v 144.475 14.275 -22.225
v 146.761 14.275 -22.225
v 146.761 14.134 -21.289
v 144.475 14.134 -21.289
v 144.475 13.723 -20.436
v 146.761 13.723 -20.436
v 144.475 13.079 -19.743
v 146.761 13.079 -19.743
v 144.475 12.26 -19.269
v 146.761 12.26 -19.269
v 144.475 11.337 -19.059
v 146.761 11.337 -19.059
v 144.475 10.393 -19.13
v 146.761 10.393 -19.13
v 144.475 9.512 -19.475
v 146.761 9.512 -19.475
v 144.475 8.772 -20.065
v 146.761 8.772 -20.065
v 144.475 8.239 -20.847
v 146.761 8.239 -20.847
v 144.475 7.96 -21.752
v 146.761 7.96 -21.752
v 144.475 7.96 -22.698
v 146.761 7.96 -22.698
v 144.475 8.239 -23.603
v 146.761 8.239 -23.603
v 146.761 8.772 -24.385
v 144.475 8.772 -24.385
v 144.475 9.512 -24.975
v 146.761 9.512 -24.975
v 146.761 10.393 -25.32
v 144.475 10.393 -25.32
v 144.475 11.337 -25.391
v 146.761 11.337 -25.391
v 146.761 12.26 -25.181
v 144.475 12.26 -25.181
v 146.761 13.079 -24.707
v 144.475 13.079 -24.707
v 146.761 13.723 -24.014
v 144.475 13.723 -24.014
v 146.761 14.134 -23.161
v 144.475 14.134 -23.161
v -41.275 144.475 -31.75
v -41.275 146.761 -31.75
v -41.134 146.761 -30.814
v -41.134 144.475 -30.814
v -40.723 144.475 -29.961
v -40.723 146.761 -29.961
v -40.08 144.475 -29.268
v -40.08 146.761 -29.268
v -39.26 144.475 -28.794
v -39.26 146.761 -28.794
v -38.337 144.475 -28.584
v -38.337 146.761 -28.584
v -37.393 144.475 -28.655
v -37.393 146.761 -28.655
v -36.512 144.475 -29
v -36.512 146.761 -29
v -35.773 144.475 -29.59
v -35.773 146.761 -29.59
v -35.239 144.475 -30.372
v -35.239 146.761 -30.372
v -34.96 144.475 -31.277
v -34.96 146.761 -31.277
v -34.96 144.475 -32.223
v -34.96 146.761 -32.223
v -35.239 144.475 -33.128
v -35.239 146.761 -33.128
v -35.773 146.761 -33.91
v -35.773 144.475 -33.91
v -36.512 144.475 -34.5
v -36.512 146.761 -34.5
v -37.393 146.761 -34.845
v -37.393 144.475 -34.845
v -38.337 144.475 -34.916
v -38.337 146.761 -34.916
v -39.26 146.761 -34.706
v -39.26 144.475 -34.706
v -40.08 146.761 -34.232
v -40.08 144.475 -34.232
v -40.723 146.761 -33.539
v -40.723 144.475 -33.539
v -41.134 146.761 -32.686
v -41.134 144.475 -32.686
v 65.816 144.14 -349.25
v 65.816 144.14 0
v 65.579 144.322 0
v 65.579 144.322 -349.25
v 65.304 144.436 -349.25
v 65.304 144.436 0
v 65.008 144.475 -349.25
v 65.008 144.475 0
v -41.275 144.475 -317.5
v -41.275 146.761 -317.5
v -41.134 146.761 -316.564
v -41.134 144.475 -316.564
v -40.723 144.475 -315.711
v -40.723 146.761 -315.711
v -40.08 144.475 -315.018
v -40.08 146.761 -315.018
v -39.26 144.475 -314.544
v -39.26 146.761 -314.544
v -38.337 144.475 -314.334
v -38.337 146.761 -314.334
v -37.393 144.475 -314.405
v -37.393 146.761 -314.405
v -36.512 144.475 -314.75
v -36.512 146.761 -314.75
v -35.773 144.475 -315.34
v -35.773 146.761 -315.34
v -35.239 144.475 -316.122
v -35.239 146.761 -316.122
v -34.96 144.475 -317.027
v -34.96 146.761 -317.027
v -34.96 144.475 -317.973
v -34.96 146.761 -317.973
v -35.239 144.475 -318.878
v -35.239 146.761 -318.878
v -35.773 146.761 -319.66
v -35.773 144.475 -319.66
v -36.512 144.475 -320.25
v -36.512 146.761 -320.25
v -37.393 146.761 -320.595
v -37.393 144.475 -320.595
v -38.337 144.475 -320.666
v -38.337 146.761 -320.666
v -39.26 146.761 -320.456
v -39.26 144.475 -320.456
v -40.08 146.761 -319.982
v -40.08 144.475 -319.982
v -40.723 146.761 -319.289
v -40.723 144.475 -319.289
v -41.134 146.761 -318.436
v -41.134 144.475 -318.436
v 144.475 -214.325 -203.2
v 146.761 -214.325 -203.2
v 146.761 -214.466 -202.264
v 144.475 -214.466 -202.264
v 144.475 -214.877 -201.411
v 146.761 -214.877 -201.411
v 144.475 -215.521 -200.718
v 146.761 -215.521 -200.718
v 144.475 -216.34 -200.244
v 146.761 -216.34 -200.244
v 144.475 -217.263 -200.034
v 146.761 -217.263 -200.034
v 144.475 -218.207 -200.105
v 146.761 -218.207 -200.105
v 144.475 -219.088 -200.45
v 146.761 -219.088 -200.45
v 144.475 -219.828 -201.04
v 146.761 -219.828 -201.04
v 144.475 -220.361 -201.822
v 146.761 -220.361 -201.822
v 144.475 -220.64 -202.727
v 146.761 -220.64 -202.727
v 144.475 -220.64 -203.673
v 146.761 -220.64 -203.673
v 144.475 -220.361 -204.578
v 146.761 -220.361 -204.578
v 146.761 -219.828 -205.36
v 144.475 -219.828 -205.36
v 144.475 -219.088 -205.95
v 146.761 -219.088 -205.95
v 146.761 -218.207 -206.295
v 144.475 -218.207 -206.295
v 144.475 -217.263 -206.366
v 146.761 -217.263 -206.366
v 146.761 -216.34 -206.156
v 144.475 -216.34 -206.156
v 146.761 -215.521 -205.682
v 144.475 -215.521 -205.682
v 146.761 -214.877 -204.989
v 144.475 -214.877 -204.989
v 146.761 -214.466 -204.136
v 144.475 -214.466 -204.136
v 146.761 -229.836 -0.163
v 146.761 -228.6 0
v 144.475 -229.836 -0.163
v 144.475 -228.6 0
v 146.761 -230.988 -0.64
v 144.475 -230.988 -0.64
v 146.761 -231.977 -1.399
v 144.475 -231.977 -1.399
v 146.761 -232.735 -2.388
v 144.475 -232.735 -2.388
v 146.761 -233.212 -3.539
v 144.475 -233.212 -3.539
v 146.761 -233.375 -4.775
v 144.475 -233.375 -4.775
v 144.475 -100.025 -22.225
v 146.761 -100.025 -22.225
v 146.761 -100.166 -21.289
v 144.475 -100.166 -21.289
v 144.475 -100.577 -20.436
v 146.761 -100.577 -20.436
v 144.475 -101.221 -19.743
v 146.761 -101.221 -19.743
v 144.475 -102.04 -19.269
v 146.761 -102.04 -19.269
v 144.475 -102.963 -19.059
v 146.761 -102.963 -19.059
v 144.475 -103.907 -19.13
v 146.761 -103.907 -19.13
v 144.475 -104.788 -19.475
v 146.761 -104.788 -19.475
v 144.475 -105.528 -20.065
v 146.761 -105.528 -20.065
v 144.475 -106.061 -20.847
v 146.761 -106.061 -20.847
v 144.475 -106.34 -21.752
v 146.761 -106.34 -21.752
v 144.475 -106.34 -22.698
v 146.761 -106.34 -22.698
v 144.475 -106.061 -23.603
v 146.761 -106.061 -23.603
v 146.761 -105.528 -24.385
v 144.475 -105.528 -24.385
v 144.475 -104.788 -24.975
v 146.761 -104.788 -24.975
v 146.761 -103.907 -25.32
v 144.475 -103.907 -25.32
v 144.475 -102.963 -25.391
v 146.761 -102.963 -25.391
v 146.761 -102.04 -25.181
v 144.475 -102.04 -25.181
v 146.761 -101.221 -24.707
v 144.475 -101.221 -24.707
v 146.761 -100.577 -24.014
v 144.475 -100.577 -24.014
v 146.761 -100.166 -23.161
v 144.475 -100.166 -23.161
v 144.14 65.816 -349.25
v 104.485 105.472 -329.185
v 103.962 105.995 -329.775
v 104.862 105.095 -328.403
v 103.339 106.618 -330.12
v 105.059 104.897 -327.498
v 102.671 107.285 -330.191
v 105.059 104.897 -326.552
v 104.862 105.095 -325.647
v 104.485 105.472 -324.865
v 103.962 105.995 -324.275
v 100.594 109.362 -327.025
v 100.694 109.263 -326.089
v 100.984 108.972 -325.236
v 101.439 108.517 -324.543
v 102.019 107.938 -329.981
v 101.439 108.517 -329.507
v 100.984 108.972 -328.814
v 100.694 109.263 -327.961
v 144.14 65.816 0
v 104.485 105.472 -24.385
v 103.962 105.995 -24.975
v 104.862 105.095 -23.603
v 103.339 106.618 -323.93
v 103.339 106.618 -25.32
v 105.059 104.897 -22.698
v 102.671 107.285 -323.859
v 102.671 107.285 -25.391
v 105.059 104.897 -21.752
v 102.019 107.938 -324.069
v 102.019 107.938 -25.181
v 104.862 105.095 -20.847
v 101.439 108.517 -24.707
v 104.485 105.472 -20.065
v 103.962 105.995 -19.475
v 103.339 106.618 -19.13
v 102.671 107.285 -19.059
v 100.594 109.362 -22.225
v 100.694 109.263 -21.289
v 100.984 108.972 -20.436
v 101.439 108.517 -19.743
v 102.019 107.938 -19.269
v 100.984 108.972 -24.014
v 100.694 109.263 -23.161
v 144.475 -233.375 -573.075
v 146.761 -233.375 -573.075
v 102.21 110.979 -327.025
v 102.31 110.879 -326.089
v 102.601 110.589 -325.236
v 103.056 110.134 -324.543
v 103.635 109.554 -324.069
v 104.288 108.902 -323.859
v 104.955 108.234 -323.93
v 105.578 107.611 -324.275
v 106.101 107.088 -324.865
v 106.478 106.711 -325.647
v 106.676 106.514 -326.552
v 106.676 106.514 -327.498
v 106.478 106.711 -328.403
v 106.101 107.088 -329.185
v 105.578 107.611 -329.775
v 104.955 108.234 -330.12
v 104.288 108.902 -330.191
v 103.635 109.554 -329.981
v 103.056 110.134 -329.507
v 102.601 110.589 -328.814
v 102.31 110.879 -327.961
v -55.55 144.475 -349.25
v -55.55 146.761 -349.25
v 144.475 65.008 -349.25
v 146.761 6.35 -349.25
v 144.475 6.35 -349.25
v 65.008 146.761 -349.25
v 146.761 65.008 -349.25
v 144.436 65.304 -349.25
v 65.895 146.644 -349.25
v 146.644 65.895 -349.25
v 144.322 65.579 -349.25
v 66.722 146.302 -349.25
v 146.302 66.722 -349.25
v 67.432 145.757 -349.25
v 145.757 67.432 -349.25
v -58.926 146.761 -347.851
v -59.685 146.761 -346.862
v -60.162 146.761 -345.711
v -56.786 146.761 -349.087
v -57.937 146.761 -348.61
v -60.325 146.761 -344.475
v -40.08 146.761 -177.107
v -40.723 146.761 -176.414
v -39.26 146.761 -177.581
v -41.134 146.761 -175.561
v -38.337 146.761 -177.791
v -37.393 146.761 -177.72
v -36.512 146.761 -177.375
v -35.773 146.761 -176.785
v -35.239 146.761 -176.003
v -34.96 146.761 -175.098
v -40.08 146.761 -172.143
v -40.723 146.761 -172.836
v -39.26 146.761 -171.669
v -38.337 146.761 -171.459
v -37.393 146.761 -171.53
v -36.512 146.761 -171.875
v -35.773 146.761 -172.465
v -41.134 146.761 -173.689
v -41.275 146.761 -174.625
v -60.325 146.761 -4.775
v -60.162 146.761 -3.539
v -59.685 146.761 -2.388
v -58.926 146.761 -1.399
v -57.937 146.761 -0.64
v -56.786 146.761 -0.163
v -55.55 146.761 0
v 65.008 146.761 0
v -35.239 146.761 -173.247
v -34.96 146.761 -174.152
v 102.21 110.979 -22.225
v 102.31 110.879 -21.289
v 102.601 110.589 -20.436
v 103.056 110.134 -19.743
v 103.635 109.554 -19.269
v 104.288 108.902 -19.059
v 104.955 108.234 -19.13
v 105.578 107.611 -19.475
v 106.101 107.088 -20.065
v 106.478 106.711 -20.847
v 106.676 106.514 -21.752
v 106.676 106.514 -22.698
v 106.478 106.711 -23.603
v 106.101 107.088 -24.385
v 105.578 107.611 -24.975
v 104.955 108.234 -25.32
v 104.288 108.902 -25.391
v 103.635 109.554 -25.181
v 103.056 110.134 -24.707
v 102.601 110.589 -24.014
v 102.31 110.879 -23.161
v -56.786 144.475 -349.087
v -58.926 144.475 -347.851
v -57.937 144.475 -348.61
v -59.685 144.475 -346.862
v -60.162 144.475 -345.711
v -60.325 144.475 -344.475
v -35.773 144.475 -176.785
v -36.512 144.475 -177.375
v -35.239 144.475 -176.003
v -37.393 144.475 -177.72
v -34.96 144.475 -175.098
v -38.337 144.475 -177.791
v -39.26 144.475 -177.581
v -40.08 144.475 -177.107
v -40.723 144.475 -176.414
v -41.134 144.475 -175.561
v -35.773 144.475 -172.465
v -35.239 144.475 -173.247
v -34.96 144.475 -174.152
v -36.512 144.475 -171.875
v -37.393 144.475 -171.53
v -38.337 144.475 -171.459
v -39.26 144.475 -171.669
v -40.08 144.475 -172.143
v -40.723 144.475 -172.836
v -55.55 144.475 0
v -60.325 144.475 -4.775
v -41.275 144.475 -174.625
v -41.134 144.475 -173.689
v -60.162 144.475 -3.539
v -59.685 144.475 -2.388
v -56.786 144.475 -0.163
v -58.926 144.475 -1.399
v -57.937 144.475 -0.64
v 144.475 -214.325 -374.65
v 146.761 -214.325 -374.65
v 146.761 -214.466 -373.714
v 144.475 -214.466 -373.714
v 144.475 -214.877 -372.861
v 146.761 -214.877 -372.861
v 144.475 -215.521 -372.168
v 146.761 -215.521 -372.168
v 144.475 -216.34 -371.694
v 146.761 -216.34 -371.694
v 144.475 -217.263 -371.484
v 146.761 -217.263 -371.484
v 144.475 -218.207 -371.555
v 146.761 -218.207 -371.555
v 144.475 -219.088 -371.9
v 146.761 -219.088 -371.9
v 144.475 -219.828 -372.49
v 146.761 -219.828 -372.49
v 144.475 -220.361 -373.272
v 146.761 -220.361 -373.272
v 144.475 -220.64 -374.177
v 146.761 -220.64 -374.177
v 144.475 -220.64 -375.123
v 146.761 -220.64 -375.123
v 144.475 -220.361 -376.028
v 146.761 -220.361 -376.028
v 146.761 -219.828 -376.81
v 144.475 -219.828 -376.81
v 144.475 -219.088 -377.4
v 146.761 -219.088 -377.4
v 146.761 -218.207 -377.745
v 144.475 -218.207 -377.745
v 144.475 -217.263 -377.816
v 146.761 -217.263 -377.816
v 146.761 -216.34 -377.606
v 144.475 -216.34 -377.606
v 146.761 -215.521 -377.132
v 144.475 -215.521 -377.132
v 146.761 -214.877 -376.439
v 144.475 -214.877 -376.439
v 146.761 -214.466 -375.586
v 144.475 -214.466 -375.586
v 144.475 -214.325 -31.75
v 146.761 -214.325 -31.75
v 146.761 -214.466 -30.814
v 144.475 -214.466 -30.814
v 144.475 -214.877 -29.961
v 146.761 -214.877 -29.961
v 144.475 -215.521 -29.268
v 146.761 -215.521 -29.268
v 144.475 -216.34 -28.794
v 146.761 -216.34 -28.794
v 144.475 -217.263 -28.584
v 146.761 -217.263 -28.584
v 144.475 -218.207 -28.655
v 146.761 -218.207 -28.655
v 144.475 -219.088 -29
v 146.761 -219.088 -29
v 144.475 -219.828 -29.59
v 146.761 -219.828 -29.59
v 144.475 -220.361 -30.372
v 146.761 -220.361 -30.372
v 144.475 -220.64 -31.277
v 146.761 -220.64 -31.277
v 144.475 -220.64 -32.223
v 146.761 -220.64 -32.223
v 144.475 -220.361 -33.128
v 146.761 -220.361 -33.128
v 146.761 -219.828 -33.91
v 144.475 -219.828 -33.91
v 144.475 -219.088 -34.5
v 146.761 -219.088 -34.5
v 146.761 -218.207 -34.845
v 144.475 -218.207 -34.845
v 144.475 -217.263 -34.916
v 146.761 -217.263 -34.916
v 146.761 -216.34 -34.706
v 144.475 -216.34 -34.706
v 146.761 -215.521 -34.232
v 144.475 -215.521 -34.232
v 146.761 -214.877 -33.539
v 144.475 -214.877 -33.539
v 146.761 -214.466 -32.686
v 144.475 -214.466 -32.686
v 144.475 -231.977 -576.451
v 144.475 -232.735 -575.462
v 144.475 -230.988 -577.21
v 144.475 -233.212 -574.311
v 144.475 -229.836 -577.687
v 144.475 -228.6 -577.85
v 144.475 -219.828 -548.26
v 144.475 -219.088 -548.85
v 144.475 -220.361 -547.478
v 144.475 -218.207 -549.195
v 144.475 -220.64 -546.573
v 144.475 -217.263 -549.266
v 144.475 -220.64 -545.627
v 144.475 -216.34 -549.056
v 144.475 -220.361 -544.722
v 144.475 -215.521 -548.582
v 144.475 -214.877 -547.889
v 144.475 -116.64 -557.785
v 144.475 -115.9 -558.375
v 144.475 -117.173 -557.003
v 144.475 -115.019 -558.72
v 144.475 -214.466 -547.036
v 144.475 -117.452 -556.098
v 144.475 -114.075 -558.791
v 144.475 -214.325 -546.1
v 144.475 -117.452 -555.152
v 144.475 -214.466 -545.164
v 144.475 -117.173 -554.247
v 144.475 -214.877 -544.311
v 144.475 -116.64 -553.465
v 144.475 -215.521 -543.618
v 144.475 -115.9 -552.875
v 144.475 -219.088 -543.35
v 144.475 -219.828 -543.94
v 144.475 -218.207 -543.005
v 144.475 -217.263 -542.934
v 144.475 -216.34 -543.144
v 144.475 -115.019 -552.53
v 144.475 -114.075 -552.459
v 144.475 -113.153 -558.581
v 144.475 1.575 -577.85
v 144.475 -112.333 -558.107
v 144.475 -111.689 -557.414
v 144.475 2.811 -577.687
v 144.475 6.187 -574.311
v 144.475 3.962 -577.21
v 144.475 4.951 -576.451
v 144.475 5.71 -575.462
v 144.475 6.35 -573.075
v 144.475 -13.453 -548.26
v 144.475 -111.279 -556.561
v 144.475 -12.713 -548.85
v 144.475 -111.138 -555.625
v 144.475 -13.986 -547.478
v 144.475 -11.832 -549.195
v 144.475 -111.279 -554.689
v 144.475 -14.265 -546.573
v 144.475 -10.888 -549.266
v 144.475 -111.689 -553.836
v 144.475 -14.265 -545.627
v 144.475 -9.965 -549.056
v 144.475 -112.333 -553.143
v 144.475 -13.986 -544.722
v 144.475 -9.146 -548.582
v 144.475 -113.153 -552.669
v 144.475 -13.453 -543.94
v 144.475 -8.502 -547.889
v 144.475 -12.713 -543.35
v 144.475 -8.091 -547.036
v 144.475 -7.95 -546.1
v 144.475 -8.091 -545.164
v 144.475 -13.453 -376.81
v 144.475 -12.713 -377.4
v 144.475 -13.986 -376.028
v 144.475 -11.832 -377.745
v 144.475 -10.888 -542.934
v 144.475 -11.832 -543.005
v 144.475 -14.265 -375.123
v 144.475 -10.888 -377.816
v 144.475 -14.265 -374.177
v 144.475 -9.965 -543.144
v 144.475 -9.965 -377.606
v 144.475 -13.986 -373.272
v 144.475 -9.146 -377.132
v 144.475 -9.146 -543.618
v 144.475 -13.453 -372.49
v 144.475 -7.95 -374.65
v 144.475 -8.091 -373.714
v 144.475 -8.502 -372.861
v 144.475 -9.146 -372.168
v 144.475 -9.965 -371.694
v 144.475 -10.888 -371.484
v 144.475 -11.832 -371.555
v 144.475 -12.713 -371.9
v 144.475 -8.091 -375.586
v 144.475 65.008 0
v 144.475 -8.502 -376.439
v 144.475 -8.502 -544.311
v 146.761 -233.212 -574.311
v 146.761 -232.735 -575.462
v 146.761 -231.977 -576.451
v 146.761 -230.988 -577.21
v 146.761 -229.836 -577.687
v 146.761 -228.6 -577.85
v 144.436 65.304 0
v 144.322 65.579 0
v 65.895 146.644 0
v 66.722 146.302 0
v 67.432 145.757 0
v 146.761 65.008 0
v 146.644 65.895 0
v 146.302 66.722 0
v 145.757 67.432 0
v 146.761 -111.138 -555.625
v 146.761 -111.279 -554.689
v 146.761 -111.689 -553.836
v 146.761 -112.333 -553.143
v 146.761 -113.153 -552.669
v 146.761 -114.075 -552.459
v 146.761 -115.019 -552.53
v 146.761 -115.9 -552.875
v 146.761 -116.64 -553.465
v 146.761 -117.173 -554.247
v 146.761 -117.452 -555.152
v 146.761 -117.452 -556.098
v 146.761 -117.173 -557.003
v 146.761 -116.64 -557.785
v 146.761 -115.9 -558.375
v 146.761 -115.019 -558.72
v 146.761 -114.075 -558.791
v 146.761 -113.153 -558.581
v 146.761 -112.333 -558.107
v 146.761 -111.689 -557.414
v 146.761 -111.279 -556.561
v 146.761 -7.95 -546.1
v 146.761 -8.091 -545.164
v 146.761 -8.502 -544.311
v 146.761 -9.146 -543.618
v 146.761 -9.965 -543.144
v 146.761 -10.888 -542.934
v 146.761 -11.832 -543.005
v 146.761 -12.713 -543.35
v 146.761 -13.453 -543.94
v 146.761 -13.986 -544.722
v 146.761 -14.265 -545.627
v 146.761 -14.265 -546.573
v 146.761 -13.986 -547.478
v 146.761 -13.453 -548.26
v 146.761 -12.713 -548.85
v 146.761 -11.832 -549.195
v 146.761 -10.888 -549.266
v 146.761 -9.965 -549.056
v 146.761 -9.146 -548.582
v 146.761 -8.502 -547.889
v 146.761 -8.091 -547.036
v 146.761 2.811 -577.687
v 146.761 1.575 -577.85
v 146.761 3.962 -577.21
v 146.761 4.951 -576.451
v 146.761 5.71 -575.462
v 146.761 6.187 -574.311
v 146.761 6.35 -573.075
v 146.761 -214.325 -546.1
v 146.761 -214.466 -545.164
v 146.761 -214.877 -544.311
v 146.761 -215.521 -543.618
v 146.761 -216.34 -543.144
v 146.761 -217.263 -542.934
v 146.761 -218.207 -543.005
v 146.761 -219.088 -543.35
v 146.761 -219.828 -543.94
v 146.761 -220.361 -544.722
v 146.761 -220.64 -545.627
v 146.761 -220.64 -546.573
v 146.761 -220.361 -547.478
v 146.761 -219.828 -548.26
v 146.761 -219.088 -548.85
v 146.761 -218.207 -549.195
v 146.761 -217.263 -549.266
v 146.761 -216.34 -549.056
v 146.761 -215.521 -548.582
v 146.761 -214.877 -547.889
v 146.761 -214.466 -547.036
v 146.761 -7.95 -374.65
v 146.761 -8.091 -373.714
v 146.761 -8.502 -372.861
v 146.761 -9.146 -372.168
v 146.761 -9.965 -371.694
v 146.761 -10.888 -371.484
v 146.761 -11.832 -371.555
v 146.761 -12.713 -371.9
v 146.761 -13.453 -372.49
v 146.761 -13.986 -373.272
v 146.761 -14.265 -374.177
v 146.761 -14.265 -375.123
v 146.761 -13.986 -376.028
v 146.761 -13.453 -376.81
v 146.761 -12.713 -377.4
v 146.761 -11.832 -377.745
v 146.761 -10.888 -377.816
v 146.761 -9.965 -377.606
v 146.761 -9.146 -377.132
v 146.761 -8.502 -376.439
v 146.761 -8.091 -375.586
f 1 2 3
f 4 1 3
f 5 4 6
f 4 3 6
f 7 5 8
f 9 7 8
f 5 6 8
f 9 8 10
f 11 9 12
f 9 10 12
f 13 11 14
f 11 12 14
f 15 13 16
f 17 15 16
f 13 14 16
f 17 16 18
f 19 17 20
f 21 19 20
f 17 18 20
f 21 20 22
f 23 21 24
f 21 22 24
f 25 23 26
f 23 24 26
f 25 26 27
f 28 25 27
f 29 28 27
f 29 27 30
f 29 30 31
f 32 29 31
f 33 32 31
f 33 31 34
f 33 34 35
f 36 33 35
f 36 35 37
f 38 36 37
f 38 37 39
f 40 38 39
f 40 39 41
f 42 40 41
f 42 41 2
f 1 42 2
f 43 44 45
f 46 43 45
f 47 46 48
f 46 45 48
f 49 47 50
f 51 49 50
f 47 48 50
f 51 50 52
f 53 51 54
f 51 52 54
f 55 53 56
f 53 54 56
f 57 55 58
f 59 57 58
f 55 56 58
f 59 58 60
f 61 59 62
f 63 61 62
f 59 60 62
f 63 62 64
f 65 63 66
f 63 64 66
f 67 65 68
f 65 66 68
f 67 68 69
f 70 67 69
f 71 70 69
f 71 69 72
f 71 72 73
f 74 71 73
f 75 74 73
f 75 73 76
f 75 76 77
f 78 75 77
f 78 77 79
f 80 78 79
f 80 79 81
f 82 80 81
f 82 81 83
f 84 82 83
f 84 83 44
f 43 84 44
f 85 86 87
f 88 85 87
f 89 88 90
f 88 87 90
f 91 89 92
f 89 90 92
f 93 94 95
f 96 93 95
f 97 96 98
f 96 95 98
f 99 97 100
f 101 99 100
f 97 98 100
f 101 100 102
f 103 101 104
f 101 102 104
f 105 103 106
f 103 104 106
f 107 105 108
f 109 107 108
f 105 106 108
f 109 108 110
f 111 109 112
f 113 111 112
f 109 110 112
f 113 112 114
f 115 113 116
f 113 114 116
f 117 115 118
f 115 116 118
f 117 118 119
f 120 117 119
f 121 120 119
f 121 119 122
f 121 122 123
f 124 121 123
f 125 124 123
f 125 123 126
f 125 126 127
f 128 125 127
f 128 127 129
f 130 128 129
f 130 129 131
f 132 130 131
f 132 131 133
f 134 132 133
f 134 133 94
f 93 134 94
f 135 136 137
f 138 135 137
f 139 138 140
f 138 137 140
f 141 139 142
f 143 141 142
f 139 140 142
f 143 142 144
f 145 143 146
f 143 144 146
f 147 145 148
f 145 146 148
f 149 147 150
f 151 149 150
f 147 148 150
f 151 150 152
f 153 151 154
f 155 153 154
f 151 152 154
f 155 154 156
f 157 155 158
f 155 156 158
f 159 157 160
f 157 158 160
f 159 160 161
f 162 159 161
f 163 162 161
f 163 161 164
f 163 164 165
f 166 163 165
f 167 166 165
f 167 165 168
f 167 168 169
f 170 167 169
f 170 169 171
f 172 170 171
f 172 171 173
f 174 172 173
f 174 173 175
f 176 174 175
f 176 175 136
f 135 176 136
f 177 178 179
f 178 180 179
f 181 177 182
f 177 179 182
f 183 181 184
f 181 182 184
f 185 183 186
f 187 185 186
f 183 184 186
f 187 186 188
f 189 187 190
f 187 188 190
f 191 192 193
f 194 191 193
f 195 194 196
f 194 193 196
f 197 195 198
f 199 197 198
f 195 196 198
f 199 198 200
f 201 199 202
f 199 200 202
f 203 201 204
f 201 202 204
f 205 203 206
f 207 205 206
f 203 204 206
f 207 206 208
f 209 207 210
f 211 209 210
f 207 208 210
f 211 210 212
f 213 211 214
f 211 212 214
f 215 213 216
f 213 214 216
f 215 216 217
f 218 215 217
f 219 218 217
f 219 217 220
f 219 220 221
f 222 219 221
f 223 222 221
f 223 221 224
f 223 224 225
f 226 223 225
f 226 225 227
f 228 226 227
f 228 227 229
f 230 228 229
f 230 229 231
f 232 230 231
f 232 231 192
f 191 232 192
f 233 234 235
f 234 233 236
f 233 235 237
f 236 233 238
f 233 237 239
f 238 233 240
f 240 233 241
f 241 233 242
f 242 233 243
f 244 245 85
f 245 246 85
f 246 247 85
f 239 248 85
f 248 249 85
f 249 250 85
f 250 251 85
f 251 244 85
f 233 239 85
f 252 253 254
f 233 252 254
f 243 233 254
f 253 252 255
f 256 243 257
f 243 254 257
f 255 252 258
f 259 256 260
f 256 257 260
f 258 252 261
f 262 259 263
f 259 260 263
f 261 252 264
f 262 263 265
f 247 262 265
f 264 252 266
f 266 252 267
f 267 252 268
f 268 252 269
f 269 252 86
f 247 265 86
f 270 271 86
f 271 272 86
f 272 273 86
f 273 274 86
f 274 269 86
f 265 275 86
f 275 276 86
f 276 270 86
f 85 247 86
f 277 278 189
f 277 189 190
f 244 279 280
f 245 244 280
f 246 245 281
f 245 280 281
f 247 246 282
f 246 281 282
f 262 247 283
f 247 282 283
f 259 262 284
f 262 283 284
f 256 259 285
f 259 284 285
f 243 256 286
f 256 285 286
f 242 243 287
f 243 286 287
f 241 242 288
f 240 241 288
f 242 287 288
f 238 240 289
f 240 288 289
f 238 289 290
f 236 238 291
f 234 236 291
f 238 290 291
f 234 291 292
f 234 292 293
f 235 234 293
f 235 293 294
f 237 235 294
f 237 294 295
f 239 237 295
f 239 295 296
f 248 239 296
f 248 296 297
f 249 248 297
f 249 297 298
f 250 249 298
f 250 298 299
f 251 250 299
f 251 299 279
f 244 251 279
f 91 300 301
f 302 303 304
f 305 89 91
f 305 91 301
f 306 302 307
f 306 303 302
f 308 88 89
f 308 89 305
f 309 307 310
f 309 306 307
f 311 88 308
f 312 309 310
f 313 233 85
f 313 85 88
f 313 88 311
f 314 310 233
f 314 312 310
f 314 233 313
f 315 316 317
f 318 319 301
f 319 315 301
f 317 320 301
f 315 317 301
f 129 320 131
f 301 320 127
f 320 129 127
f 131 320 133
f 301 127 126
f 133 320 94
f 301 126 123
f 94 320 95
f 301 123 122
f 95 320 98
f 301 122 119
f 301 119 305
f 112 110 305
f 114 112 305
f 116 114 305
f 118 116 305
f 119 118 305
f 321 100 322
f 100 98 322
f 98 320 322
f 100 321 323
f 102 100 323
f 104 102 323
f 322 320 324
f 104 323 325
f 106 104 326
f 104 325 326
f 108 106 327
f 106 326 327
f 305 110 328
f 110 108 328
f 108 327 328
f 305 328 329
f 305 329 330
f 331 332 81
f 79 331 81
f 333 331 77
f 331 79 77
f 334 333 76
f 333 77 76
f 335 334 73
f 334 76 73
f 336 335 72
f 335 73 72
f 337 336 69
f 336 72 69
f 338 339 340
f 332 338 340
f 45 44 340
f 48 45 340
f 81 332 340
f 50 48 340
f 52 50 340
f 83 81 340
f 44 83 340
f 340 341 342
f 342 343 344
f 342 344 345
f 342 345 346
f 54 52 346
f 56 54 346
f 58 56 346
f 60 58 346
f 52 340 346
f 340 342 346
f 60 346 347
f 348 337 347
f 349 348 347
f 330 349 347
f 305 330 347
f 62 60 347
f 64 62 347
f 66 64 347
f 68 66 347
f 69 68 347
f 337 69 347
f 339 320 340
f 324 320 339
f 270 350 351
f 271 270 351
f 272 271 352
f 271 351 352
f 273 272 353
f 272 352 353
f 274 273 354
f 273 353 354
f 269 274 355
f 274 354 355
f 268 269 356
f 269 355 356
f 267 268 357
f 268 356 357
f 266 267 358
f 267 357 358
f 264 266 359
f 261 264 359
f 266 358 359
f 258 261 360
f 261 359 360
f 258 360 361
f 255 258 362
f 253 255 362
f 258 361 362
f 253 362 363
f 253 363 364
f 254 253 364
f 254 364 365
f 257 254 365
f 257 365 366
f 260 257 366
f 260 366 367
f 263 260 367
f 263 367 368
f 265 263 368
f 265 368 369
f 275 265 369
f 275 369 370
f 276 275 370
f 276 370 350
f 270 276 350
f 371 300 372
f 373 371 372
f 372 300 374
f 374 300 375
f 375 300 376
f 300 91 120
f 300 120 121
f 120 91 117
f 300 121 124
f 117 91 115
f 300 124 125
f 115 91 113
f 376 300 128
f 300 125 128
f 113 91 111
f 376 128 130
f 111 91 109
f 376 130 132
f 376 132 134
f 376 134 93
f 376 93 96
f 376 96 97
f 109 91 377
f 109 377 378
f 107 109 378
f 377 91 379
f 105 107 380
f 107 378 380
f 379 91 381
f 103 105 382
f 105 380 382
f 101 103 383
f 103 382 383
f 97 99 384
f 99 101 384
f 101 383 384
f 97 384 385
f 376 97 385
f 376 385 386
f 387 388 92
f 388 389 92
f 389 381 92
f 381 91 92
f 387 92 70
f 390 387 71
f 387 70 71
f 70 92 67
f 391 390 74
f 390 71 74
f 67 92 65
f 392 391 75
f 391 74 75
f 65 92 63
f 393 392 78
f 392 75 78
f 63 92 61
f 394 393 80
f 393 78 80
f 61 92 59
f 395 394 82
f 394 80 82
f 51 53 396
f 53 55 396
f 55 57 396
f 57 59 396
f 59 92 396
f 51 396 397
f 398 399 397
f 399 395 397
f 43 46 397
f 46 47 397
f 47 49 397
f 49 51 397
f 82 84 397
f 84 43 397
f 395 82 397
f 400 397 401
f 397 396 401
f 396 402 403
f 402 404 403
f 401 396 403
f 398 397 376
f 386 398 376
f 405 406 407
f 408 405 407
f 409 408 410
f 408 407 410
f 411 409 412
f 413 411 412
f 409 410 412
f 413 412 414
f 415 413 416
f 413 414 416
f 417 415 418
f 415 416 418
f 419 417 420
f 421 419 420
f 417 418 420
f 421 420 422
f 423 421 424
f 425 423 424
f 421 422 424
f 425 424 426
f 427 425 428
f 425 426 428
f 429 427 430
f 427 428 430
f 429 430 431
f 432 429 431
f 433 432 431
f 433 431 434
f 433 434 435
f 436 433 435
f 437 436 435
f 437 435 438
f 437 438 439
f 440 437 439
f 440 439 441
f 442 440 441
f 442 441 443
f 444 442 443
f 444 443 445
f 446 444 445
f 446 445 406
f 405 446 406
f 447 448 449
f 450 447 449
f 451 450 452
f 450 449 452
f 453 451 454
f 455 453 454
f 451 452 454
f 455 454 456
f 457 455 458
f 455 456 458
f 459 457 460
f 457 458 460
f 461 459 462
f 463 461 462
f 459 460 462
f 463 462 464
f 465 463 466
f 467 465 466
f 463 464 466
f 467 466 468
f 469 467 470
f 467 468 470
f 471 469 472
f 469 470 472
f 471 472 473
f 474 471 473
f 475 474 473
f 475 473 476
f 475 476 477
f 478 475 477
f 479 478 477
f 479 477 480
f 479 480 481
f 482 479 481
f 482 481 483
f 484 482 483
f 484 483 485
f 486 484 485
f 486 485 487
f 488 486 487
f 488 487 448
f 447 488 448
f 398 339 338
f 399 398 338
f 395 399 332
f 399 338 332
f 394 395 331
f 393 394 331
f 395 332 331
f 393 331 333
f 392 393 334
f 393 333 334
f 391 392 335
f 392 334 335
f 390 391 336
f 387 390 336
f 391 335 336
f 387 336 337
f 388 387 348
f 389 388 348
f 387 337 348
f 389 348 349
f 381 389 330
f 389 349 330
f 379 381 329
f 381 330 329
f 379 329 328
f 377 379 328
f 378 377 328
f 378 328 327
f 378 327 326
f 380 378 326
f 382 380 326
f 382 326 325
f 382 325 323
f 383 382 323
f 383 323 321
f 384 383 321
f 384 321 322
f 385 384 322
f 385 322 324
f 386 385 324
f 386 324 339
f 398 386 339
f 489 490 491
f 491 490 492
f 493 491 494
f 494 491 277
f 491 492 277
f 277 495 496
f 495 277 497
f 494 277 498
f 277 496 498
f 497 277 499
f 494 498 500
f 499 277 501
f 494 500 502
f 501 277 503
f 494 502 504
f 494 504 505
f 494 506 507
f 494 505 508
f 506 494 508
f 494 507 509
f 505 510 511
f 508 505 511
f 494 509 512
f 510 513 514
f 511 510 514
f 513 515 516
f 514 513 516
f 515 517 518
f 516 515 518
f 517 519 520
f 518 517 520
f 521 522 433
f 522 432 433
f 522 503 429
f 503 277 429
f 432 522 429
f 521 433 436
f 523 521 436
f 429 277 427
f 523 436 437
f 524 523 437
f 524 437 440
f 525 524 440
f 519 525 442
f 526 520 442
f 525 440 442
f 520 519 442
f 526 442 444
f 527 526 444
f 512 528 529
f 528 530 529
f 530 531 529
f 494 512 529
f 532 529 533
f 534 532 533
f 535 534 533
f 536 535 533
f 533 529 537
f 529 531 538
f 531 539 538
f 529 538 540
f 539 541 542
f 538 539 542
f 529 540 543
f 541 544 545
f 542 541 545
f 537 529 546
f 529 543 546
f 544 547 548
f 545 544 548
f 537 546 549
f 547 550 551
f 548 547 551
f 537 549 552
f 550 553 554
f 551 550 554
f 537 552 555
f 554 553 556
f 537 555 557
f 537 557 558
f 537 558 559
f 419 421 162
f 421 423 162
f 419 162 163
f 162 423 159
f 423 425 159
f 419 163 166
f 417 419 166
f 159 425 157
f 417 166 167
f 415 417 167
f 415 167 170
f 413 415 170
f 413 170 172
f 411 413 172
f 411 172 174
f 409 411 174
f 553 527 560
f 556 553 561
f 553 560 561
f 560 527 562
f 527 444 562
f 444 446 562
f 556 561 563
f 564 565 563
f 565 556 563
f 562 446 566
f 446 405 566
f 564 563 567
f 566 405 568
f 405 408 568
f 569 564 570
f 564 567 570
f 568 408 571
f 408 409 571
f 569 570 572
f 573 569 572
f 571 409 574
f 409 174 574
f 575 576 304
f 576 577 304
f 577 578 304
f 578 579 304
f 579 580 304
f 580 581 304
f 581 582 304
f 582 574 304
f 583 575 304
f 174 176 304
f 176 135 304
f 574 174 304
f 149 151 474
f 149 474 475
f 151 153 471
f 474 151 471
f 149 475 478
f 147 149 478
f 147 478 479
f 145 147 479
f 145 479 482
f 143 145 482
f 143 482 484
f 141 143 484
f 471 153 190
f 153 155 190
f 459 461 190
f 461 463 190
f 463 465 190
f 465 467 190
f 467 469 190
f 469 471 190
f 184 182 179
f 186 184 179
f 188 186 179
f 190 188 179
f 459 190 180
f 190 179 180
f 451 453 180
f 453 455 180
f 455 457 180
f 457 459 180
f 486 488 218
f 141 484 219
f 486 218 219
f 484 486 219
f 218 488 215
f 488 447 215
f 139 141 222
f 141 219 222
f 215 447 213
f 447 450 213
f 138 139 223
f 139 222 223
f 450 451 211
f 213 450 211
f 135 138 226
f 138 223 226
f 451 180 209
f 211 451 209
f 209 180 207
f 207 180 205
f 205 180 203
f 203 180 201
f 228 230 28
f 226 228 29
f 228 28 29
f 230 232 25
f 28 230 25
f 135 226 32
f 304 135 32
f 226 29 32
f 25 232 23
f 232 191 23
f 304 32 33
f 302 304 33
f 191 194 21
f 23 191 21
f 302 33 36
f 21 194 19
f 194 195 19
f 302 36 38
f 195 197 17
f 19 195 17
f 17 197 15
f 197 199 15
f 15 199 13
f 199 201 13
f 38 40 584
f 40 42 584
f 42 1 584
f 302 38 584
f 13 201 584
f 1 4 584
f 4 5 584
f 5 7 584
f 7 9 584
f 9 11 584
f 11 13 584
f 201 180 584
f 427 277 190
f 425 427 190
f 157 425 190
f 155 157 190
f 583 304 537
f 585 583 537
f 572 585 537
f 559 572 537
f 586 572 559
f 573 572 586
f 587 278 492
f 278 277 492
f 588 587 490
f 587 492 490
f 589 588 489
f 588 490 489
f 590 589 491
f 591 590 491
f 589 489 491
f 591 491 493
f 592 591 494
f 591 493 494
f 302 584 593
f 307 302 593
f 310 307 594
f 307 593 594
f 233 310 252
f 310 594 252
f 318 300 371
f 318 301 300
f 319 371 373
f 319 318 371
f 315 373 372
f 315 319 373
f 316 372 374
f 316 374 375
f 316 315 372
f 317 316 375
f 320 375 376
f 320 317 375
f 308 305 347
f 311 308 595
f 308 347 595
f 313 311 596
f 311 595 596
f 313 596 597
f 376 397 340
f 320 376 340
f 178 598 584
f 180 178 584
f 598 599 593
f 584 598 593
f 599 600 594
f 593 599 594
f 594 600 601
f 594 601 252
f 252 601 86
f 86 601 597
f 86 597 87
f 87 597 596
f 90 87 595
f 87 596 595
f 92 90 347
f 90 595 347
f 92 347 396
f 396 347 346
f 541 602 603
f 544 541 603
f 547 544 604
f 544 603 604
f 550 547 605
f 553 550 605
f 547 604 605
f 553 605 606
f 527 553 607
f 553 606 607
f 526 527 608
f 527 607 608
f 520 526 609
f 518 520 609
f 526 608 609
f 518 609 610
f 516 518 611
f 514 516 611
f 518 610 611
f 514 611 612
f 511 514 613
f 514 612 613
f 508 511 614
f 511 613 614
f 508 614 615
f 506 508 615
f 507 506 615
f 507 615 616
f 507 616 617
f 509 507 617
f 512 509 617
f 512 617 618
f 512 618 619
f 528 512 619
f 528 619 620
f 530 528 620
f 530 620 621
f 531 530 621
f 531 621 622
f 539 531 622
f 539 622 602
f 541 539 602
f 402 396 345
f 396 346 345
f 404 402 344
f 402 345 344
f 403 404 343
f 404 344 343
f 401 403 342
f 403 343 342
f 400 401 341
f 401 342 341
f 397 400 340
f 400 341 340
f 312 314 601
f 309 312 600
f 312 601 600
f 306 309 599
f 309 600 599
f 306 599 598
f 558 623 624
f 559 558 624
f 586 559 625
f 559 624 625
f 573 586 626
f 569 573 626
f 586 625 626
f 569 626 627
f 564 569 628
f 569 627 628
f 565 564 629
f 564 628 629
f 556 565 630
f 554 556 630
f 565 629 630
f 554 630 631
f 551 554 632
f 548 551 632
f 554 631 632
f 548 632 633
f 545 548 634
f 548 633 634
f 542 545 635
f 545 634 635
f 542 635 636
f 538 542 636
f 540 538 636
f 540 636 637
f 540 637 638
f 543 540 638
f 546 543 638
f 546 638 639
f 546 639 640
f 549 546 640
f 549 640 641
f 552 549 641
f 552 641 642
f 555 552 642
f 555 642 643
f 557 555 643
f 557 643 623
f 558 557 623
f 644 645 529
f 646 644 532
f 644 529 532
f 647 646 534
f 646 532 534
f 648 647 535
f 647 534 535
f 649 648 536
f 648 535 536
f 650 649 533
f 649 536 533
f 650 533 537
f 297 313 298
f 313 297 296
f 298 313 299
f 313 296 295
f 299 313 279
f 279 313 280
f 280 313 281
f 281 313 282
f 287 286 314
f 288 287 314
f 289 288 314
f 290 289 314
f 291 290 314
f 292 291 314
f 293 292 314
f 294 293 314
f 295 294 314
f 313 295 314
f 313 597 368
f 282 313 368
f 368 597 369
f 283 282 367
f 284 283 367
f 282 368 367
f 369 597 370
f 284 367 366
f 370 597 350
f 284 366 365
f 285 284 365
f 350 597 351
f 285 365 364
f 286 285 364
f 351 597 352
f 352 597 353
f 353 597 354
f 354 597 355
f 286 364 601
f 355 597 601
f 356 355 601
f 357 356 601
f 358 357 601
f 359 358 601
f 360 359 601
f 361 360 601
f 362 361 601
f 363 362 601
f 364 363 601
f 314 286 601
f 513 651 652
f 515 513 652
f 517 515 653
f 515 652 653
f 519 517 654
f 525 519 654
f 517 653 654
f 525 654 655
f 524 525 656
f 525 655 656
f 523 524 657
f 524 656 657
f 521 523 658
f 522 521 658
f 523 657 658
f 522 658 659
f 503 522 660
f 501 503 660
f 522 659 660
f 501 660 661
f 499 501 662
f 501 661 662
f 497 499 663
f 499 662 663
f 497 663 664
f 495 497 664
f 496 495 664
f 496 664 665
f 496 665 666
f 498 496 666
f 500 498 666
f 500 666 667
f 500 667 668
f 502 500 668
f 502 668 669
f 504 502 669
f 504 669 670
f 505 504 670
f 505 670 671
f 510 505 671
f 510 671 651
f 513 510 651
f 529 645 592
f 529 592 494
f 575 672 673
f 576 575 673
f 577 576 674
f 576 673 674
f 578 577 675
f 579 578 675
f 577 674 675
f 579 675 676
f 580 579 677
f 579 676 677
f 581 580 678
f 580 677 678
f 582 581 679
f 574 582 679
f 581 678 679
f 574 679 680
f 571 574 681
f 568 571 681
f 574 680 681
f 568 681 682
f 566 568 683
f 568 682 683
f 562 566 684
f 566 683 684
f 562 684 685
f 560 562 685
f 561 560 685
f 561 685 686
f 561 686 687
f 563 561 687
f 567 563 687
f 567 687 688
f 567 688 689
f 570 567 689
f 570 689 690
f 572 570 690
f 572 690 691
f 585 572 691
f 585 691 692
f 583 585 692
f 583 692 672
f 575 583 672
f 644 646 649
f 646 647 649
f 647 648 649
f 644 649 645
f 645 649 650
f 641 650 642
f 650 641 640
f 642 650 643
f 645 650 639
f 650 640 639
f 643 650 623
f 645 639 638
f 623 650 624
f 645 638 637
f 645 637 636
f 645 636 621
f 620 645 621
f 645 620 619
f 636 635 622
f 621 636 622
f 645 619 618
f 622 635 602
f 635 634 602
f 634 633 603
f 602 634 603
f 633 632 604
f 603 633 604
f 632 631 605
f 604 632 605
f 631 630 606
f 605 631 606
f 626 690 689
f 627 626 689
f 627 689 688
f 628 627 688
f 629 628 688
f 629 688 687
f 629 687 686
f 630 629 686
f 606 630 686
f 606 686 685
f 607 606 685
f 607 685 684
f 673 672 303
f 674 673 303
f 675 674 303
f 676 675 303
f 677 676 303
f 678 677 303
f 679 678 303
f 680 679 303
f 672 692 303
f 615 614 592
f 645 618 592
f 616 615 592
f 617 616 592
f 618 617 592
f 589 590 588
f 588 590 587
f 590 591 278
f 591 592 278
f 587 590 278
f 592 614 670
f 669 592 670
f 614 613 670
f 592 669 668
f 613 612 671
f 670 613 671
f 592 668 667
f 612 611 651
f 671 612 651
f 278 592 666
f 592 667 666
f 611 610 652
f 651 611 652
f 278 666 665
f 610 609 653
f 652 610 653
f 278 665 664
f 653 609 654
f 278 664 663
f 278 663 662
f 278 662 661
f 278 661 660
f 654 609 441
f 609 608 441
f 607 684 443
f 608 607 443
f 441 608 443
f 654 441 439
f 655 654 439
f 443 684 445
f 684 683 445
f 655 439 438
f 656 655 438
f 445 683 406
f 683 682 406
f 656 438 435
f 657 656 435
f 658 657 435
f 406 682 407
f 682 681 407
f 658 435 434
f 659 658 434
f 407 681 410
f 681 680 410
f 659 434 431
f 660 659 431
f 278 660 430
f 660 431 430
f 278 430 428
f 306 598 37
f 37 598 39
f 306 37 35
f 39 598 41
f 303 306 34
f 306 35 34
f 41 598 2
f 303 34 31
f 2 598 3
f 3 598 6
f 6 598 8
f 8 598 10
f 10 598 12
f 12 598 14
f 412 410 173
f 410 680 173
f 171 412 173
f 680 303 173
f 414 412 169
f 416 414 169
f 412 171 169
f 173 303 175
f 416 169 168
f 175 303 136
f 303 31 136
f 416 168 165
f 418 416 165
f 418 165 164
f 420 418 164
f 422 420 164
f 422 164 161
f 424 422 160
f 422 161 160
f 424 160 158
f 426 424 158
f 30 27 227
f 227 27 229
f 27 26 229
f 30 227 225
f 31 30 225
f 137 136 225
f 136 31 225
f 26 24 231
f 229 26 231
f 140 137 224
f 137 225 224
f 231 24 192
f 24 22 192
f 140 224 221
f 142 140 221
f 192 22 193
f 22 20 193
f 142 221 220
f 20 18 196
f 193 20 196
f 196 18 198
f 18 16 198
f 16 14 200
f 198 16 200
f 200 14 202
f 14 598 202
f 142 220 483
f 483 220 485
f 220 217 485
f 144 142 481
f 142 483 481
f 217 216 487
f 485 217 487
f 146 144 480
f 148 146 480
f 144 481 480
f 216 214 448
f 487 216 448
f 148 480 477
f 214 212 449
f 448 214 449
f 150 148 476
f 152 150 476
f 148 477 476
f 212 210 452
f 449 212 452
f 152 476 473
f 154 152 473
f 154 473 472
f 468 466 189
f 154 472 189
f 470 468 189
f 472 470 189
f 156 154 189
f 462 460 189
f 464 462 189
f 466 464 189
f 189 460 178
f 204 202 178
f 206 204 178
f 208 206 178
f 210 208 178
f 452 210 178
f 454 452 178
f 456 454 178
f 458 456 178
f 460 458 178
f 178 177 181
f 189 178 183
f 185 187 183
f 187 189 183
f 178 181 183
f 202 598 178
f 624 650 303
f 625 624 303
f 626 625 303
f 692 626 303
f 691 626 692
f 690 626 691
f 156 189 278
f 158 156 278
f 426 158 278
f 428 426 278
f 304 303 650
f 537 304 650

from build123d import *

# Parameters (mm, degrees)
BASE_FLANGE1_DEPTH                     = 577.85
SKETCH5_W                              = 369.801004036
SKETCH5_H                              = 271.212830699
CE_00_NOTCH_DEPTH                      = 254
SKETCH9_R                              = 3.175
CE_00_HOLES_0_250_SIDE_9_PLACES_DEPTH  = 7.62
SKETCH10_R                             = 3.175
CE_00_HOLES_0_250_ANGLE_2_PLACES_DEPTH = 7.62
SKETCH8_R                              = 3.175
CE_00_HOLES_0_250_TOP_3_PLACES_DEPTH   = 7.62
FILLET1_R                              = 4.7752


# Sheet-metal steps are written as plain solids
with BuildPart() as part:
    # Sketch1 → Base-Flange1 (new body)
    with BuildSketch(Plane.XY):
        with BuildLine():
            Line((144.4752, -233.3752), (144.4752, 65.007753898))
            ThreePointArc((144.4752, 65.007753898), (144.388194306, 65.445161061), (144.140423051, 65.815976949))
            Line((144.140423051, 65.815976949), (65.815976949, 144.140423051))
            ThreePointArc((65.815976949, 144.140423051), (65.445161061, 144.388194306), (65.007753898, 144.4752))
            Line((65.007753898, 144.4752), (-60.325, 144.4752))
            Line((-60.325, 144.4752), (-60.325, 146.7612))
            Line((-60.325, 146.7612), (65.007753898, 146.7612))
            ThreePointArc((65.007753898, 146.7612), (66.319975388, 146.500182917), (67.432423051, 145.756869153))
            Line((67.432423051, 145.756869153), (145.756869153, 67.432423051))
            ThreePointArc((145.756869153, 67.432423051), (146.500182917, 66.319975388), (146.7612, 65.007753898))
            Line((146.7612, 65.007753898), (146.7612, -233.3752))
            Line((146.7612, -233.3752), (144.4752, -233.3752))
        make_face()
    extrude(amount=-BASE_FLANGE1_DEPTH)

    # Sketch5 → CE-00 Notch (cut, symmetric)
    with BuildSketch(Plane(origin=(0, 0, 0), x_dir=(0, 0, -1), z_dir=(1, 0, 0))):
        with Locations((534.150502018, 141.95641535)):
            Rectangle(SKETCH5_W, SKETCH5_H)
    extrude(amount=CE_00_NOTCH_DEPTH, both=True, mode=Mode.SUBTRACT)

    # Sketch9 → CE-00 Holes 0.250 Side 9 Places (cut)
    with BuildSketch(Plane(origin=(146.7612, 0, 0), x_dir=(0, 0, -1), z_dir=(1, 0, 0))):
        with Locations(Location((31.75, -217.5002, 0), (0, 0, 90))):
            Circle(SKETCH9_R)
        with Locations(Location((203.2, -217.5002, 0), (0, 0, 90))):
            Circle(SKETCH9_R)
        with Locations(Location((374.65, -217.5002, 0), (0, 0, 90))):
            Circle(SKETCH9_R)
        with Locations(Location((546.1, -217.5002, 0), (0, 0, 90))):
            Circle(SKETCH9_R)
        with Locations(Location((546.1, -11.1252, 0), (0, 0, 90))):
            Circle(SKETCH9_R)
        with Locations(Location((374.65, -11.1252, 0), (0, 0, 90))):
            Circle(SKETCH9_R)
        with Locations(Location((22.225, 11.0998, 0), (0, 0, 90))):
            Circle(SKETCH9_R)
        with Locations(Location((22.225, -103.2002, 0), (0, 0, 90))):
            Circle(SKETCH9_R)
        with Locations(Location((555.625, -114.3127, 0), (0, 0, 90))):
            Circle(SKETCH9_R)
    extrude(amount=-CE_00_HOLES_0_250_SIDE_9_PLACES_DEPTH, mode=Mode.SUBTRACT)

    # Sketch10 → CE-00 Holes 0.250 Angle 2 Places (cut)
    with BuildSketch(Plane(origin=(106.594646102, 106.594646102, 0), x_dir=(0, 0, -1), z_dir=(0.7071067811865511, 0.707106781186544, 0))):
        with Locations(Location((22.225, 3.025193073, 0), (0, 0, 90))):
            Circle(SKETCH10_R)
        with Locations(Location((327.025, 3.025193073, 0), (0, 0, 90))):
            Circle(SKETCH10_R)
    extrude(amount=-CE_00_HOLES_0_250_ANGLE_2_PLACES_DEPTH, mode=Mode.SUBTRACT)

    # Sketch8 → CE-00 Holes 0.250 Top 3 Places (cut)
    with BuildSketch(Plane(origin=(0, 146.7612, 0), x_dir=(1, 0, 0), z_dir=(0, 1, 0))):
        with Locations(Location((-38.1, 31.75, 0), (0, 0, 180))):
            Circle(SKETCH8_R)
        with Locations(Location((-38.1, 317.5, 0), (0, 0, 180))):
            Circle(SKETCH8_R)
        with Locations(Location((-38.1, 174.625, 0), (0, 0, 180))):
            Circle(SKETCH8_R)
    extrude(amount=-CE_00_HOLES_0_250_TOP_3_PLACES_DEPTH, mode=Mode.SUBTRACT)

    # Fillet1
    fillet1_edges = [part.edges().sort_by_distance(p)[0] for p in [
        (145.6182, -233.3752, 0),
        (-60.325, 145.6182, 0),
        (145.6182, -233.3752, -577.85),
        (-60.325, 145.6182, -349.25),
        (145.6182, 6.35, -577.85),
    ]]
    fillet(fillet1_edges, radius=FILLET1_R)


solid = part.part
